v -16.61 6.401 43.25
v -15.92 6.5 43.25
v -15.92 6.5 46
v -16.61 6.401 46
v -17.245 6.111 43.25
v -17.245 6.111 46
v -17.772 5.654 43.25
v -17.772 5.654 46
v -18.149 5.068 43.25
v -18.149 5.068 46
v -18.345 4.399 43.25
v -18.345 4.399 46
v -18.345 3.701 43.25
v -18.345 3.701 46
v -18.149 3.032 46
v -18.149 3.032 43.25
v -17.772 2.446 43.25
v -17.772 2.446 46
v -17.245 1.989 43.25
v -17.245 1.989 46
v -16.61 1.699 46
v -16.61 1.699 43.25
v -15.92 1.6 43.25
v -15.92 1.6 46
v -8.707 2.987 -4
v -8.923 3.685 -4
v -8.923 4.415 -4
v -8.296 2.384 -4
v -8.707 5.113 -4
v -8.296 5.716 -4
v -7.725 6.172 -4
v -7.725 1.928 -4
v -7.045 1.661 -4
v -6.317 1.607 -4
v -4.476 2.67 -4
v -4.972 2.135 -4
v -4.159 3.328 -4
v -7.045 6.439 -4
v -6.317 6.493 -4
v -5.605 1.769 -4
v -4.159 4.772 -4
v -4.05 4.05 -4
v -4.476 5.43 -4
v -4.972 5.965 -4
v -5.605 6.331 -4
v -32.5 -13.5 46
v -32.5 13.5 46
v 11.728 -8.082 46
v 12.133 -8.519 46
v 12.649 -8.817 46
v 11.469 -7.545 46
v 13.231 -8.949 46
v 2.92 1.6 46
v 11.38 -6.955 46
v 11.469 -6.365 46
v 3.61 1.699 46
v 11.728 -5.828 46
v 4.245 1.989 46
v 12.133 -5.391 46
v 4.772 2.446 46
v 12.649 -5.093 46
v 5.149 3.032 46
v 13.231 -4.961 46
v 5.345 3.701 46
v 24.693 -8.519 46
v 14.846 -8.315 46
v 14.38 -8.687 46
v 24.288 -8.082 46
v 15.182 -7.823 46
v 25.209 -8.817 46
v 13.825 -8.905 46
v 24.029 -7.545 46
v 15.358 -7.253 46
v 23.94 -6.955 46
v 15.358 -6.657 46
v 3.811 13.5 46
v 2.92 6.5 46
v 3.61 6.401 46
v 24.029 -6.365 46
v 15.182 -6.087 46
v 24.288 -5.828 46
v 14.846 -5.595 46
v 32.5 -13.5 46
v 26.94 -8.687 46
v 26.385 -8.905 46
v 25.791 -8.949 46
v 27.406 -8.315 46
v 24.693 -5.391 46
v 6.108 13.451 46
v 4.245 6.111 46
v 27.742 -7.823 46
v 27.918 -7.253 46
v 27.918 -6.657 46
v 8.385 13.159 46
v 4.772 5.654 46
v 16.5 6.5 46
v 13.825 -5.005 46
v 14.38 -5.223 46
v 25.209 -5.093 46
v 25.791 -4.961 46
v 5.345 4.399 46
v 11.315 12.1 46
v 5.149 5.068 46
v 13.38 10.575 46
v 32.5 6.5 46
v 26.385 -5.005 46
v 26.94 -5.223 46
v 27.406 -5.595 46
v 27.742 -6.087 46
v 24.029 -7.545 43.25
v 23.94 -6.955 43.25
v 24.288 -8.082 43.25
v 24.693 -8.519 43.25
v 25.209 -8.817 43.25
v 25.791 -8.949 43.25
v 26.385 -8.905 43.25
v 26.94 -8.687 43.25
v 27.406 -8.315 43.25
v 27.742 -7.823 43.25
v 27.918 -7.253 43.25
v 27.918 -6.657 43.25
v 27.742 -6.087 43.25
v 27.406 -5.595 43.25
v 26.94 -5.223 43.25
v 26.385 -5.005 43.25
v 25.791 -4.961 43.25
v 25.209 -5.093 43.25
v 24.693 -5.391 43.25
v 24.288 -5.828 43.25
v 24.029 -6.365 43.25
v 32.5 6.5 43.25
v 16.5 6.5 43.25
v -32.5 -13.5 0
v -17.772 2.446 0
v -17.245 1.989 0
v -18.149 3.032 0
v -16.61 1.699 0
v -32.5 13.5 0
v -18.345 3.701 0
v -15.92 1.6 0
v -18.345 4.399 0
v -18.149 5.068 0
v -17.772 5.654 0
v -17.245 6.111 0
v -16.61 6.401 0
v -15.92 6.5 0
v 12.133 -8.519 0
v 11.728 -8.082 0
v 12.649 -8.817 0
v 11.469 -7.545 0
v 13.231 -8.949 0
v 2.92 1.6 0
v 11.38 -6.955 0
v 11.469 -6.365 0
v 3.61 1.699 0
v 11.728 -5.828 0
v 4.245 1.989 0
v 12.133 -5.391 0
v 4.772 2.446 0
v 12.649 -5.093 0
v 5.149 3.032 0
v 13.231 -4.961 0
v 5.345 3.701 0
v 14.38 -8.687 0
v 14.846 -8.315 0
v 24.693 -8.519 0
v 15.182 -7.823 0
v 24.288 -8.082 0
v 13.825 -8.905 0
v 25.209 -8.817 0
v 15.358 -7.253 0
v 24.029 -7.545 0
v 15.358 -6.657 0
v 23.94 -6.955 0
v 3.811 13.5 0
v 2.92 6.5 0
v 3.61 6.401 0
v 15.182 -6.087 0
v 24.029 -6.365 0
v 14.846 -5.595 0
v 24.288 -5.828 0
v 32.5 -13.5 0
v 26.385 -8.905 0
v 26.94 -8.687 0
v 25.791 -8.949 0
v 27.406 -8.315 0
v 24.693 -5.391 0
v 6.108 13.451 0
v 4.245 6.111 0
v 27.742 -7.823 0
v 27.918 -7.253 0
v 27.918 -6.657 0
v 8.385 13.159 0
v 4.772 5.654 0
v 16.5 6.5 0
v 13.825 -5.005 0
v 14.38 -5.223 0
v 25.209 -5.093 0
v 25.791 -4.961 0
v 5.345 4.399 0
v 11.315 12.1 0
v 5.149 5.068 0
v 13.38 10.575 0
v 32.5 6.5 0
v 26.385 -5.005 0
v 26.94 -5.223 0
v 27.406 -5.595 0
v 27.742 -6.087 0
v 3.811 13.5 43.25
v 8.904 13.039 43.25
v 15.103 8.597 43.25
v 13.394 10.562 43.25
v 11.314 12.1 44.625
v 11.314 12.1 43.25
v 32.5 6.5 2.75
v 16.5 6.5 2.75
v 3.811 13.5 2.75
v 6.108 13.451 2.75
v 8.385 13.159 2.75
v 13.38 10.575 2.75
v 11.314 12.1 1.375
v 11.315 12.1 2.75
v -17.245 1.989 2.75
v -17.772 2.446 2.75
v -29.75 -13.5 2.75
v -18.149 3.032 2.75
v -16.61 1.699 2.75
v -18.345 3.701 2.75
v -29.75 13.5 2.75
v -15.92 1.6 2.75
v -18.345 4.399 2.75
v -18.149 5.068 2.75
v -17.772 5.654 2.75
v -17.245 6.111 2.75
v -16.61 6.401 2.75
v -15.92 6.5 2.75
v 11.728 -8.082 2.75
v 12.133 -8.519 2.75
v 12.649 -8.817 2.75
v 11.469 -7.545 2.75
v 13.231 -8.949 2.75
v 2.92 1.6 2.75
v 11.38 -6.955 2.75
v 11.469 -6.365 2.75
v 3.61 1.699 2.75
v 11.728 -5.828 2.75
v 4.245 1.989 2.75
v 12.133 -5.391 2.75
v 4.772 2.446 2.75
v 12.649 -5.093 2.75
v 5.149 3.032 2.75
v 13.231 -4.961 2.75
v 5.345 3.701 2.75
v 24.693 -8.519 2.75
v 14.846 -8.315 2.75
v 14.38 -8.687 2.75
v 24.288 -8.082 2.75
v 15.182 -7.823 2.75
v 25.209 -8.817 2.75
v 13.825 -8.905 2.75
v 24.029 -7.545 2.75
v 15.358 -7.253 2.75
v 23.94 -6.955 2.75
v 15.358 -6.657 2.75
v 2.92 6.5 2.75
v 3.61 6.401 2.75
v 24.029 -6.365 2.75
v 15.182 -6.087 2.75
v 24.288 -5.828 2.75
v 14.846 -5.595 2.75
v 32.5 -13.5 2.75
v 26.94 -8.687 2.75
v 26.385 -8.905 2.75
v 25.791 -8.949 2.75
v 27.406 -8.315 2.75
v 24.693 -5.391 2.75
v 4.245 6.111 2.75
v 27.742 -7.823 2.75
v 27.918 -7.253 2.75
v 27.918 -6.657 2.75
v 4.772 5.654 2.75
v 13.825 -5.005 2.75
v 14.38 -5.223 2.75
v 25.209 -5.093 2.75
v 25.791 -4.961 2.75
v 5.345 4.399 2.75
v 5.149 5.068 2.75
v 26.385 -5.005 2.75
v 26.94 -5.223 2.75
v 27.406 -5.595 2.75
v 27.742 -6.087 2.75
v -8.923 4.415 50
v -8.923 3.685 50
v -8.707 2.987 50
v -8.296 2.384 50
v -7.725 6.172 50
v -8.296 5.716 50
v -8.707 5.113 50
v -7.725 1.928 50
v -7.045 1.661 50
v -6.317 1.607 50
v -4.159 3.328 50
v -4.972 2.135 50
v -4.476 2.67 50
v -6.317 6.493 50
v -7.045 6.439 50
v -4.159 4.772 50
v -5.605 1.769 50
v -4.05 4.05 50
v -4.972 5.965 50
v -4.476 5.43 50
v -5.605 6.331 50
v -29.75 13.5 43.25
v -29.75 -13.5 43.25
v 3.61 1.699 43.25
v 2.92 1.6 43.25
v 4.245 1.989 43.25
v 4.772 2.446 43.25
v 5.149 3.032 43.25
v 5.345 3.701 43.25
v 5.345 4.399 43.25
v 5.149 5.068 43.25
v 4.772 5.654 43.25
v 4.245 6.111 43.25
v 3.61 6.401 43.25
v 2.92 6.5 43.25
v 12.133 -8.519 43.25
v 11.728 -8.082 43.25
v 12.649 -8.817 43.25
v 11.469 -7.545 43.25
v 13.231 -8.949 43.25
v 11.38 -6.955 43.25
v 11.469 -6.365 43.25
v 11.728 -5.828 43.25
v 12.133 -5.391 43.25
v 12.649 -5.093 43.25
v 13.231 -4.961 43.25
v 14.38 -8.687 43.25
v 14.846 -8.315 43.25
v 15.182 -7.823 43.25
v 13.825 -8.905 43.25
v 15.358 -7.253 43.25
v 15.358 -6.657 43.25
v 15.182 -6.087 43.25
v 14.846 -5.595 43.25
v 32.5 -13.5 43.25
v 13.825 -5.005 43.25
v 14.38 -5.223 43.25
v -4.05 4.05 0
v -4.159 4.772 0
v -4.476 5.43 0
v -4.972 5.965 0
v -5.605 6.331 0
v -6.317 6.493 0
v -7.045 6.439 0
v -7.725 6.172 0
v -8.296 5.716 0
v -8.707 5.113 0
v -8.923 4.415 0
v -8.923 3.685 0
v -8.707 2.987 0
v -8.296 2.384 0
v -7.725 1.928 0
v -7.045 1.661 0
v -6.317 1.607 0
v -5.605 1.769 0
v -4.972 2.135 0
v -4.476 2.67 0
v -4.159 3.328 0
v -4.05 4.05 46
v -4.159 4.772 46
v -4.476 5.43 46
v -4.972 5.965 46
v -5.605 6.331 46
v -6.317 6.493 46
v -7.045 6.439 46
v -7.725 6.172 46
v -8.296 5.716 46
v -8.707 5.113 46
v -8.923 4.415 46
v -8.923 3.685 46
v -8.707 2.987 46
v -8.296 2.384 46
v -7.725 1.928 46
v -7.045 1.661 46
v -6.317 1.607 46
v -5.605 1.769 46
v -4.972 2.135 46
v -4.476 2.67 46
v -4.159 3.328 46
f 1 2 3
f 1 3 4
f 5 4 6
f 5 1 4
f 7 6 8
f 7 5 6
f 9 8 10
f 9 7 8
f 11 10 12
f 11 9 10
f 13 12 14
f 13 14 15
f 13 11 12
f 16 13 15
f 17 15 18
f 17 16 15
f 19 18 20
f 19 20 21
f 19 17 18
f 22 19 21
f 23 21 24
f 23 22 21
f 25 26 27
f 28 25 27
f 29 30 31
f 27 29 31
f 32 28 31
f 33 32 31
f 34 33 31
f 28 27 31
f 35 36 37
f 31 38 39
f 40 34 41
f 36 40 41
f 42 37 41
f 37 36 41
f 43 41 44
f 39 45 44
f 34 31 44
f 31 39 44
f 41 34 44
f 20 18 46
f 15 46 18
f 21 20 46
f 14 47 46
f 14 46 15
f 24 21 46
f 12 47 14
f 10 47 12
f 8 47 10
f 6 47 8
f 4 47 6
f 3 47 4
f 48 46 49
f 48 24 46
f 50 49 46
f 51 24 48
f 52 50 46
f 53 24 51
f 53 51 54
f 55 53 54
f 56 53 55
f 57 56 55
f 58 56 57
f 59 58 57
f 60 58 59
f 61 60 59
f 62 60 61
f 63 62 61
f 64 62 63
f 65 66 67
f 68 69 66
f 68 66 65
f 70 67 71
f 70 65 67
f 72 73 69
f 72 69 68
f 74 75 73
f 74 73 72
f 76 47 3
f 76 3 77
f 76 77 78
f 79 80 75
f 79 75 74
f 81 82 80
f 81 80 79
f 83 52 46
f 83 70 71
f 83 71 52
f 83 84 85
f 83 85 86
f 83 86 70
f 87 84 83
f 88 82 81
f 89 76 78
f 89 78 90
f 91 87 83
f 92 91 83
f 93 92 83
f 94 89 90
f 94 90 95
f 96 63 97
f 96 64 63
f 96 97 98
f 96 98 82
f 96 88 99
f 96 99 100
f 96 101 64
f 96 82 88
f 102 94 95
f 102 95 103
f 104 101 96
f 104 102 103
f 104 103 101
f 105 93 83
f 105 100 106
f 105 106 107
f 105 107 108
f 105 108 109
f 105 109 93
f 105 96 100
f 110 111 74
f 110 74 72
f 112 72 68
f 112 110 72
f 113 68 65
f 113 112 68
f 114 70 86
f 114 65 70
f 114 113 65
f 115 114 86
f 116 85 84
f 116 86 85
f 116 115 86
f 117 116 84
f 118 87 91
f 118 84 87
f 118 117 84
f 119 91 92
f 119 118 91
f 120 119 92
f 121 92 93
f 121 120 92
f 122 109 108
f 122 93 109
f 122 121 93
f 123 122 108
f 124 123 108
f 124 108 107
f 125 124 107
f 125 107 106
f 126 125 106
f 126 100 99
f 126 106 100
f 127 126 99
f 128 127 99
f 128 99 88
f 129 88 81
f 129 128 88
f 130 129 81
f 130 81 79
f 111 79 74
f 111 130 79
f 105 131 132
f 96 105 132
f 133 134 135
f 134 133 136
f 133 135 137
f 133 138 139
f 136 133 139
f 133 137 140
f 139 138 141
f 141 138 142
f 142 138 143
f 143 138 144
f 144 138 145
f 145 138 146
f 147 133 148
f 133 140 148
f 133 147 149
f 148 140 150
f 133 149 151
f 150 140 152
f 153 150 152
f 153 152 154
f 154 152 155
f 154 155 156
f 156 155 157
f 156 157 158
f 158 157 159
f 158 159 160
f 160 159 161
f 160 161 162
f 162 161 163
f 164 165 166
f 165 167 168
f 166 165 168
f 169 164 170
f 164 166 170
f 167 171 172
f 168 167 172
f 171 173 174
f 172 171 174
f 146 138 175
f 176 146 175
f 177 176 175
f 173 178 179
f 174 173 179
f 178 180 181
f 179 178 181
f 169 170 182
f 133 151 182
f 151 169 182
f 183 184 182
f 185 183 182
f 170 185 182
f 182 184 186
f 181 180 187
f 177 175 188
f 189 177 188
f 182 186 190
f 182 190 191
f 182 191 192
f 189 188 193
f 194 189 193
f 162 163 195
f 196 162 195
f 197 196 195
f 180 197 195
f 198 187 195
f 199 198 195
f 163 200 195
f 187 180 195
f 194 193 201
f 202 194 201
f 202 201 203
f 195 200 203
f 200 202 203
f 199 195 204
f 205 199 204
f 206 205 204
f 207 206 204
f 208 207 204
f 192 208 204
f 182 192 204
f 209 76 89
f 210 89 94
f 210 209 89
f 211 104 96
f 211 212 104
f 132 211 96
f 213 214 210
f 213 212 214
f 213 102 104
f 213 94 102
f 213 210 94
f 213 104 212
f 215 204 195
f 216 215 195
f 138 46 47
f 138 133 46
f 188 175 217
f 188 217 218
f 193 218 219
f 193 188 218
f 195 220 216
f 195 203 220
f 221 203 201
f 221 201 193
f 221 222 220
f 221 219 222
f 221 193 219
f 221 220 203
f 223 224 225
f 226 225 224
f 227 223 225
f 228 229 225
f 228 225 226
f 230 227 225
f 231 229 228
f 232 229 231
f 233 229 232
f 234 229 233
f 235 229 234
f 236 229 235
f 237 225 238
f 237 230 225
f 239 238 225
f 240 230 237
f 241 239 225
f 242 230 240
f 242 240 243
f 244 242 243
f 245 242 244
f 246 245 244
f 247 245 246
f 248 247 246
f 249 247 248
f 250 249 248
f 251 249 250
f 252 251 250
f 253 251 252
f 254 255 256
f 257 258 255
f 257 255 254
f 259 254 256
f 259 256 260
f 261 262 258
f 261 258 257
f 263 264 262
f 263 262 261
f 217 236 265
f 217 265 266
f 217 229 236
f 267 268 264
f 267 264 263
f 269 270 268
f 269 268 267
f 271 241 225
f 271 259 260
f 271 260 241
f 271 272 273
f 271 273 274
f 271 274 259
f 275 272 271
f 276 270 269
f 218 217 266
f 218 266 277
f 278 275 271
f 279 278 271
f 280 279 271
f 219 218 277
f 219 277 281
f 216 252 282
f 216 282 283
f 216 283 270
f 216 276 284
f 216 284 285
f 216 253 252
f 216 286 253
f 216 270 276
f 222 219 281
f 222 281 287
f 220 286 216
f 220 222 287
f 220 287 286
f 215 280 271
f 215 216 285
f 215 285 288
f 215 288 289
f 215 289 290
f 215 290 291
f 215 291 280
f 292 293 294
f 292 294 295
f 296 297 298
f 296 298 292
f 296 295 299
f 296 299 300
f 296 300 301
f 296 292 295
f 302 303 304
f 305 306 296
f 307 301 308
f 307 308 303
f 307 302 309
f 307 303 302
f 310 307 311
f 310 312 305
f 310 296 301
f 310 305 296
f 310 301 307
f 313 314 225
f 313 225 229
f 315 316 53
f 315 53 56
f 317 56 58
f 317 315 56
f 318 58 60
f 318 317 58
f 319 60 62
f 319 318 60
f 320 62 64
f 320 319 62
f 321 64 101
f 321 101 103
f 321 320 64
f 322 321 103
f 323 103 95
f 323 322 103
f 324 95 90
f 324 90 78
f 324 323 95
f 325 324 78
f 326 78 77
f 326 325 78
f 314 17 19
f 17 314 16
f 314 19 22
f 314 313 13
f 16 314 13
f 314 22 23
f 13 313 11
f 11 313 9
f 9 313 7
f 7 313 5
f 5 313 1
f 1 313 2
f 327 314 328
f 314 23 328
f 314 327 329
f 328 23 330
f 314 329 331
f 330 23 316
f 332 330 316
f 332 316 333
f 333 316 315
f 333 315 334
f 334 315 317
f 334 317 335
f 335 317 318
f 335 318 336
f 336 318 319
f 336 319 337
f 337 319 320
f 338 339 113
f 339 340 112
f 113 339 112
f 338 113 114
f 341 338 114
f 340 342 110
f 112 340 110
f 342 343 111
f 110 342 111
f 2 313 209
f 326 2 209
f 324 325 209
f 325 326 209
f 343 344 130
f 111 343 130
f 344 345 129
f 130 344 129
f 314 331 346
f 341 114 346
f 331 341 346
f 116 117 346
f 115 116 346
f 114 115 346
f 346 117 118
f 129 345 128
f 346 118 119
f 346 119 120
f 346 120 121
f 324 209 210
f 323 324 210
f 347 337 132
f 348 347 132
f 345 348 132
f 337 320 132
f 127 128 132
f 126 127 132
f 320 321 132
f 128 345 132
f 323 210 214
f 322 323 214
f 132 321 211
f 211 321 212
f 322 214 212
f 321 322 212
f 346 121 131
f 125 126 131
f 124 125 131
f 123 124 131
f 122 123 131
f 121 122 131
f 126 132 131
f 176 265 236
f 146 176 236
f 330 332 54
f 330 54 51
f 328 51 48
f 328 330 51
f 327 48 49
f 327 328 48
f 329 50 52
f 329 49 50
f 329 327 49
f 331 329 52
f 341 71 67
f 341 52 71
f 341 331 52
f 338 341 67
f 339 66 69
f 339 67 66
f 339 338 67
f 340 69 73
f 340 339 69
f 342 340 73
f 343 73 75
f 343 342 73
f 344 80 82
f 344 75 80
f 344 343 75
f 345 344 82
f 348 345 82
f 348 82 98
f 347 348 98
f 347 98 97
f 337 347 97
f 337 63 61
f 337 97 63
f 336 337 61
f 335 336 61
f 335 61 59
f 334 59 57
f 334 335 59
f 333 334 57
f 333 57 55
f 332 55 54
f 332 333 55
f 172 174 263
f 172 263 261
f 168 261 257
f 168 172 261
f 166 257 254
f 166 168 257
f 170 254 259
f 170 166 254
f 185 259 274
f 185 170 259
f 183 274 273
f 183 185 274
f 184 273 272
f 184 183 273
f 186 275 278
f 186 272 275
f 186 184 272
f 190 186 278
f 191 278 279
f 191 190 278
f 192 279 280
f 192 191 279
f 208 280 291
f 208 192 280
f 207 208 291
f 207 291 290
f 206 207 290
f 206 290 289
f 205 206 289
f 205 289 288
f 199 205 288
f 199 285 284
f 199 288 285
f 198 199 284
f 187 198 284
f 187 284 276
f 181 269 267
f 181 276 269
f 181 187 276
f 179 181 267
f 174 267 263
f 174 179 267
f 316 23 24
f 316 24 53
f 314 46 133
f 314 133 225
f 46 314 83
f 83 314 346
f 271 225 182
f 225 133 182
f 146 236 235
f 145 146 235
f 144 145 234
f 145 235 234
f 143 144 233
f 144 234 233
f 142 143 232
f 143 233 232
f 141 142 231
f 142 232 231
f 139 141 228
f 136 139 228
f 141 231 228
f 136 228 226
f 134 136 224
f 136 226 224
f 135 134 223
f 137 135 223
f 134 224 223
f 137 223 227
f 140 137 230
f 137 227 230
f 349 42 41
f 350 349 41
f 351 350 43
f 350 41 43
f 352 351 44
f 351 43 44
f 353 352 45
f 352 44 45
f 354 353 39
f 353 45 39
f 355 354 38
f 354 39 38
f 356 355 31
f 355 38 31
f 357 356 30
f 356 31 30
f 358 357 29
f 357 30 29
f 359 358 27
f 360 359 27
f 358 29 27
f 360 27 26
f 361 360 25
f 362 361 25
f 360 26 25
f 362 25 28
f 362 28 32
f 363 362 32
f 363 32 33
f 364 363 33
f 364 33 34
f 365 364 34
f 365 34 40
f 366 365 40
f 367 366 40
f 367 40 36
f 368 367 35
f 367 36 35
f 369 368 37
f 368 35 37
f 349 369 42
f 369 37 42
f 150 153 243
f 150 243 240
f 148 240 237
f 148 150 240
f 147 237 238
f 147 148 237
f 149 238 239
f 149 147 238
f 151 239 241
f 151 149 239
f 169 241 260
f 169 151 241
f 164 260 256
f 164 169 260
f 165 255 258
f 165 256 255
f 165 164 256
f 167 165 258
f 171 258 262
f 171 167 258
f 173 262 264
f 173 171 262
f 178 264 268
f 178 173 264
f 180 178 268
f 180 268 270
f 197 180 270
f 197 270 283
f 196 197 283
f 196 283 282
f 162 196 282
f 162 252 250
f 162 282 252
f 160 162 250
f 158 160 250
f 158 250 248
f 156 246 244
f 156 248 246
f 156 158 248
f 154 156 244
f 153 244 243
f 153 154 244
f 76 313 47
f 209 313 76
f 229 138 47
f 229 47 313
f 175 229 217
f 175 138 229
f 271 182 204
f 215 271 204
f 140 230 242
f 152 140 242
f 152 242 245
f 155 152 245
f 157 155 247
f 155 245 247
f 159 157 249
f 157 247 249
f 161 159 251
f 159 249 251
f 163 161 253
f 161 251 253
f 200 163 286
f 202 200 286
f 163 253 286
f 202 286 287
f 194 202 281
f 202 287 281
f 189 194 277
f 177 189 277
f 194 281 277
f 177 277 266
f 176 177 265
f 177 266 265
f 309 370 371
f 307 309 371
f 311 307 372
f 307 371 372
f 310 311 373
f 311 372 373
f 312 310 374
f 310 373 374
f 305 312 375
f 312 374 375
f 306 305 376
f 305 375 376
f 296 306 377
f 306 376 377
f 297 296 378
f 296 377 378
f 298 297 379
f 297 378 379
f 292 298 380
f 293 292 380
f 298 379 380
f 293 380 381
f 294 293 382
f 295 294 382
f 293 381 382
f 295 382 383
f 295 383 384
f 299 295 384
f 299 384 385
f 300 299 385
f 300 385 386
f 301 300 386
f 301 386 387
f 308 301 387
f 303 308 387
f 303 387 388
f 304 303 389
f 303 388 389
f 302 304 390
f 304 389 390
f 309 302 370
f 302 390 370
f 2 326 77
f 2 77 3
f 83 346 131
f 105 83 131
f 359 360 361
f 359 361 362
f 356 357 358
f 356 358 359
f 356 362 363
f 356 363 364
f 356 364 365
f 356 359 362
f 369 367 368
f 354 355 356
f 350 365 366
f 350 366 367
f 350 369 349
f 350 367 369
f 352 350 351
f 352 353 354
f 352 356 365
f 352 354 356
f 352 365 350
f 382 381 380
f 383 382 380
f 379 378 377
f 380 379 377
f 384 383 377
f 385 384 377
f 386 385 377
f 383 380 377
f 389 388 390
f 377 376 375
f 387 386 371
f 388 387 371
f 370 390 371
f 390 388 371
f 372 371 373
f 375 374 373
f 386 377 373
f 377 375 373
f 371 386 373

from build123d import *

# Parameters (mm, degrees)
BOSS_EXTRUDE1_DEPTH     = 2.75
FILLET1_START           = -1
FILLET1_DEPTH           = 5
CUT_EXTRUDE1_DEPTH      = 36.299610618
SKETCH4_W               = 2.75
SKETCH4_H               = 27
BOSS_EXTRUDE2_DEPTH     = 43.25
LPATTERN2_COUNT         = 2
LPATTERN2_PITCH         = 43.25
LPATTERN3_START         = 43.25
LPATTERN3_DEPTH         = 2.75
SKETCH6_R               = 2.45
BOSS_EXTRUDE3_DEPTH     = 4
LPATTERN4_COUNT         = 2
LPATTERN4_PITCH         = 50
CUT_EXTRUDE2_DEPTH      = 62.14327444
CUT_EXTRUDE2_DEPTH_BACK = 62.14327444
SKETCH7_R               = 2
FILLET3_START           = 43.25
FILLET3_DEPTH           = 3.75


with BuildPart() as part:
    # Sketch1 → Boss-Extrude1 (new body)
    with BuildSketch(Plane.XY):
        Polygon((-32.5, -13.5), (32.5, -13.5), (32.5, 6.5), (16.5, 6.5), (16.5, 13.5), (-32.5, 13.5), align=None)
    boss_extrude1 = extrude(amount=BOSS_EXTRUDE1_DEPTH)

    # Fillet1: read off the stored shape, not the designer's step
    # Fillet1 outline → Fillet1 (cut)
    with BuildSketch(Plane.XY.offset(FILLET1_START)):
        with BuildLine():
            Line((16.5, 13.5), (3.81142246, 13.5))
            add(Edge.make_bspline(
                [(3.81142246, 13.5), (5.301266164, 13.5), (6.791109869, 13.5), (10.115693614, 13.127081209), (12.822268118, 11.633925537), (14.910833382, 9.020532983), (15.705416691, 7.760266491), (16.5, 6.5)],
                knots=[0, 0, 0, 0, 0, 0, 0.5, 0.5, 1, 1, 1, 1, 1, 1], degree=5))
            Line((16.5, 6.5), (16.5, 13.5))
        make_face()
    extrude(amount=FILLET1_DEPTH, mode=Mode.SUBTRACT)

    # Sketch2 → Cut-Extrude1 (cut, symmetric)
    with BuildSketch(Plane.XY.offset(2.75)):
        with BuildLine():
            Line((-15.92, 1.6), (2.92, 1.6))
            ThreePointArc((2.92, 1.6), (5.37, 4.05), (2.92, 6.5))
            Line((2.92, 6.5), (-15.92, 6.5))
            ThreePointArc((-15.92, 6.5), (-18.37, 4.05), (-15.92, 1.6))
        make_face()
    extrude(amount=CUT_EXTRUDE1_DEPTH, both=True, mode=Mode.SUBTRACT)

    # Sketch4 → Boss-Extrude2 (add)
    with BuildSketch(Plane.XY.offset(2.75)):
        with Locations((-31.125, 0)):
            Rectangle(SKETCH4_W, SKETCH4_H)
    extrude(amount=BOSS_EXTRUDE2_DEPTH)

    # LPattern2: Boss-Extrude1 ×2
    with Locations(*[(0, 0, i * LPATTERN2_PITCH) for i in range(1, LPATTERN2_COUNT)]):
        add(boss_extrude1)

    # LPattern3: read off the stored shape, not the designer's step
    # LPattern3 outline → LPattern3 (cut)
    with BuildSketch(Plane.XY.offset(LPATTERN3_START)):
        with BuildLine():
            Line((2.92, 6.5), (-15.92, 6.5))
            ThreePointArc((-15.92, 6.5), (-18.37, 4.05), (-15.92, 1.6))
            Line((-15.92, 1.6), (2.92, 1.6))
            ThreePointArc((2.92, 1.6), (5.37, 4.05), (2.92, 6.5))
        make_face()
    extrude(amount=LPATTERN3_DEPTH, mode=Mode.SUBTRACT)

    # Sketch7 → Cut-Extrude2 (cut, two sides: drawn at the far end of the back side and taken through both)
    with BuildSketch(Plane.XY.offset(46).offset(-CUT_EXTRUDE2_DEPTH_BACK)):
        with Locations(Location((13.38, -6.955, 0), (0, 0, 180))):
            Circle(SKETCH7_R)
        with Locations(Location((25.94, -6.955, 0), (0, 0, 180))):
            Circle(SKETCH7_R)
    extrude(amount=CUT_EXTRUDE2_DEPTH + CUT_EXTRUDE2_DEPTH_BACK, mode=Mode.SUBTRACT)

    # Fillet3: read off the stored shape, not the designer's step
    # Fillet3 outline → Fillet3 (cut)
    with BuildSketch(Plane.XY.offset(FILLET3_START)):
        with BuildLine():
            Line((16.5, 13.5), (3.81142246, 13.5))
            add(Edge.make_bspline(
                [(3.81142246, 13.5), (5.301266164, 13.5), (6.791109869, 13.5), (10.115693614, 13.127081209), (12.822268118, 11.633925537), (14.910833382, 9.020532983), (15.705416691, 7.760266491), (16.5, 6.5)],
                knots=[0, 0, 0, 0, 0, 0, 0.5, 0.5, 1, 1, 1, 1, 1, 1], degree=5))
            Line((16.5, 6.5), (16.5, 13.5))
        make_face()
    extrude(amount=FILLET3_DEPTH, mode=Mode.SUBTRACT)


with BuildPart() as body_2:
    # Sketch6 → Boss-Extrude3 (new body)
    with BuildSketch(Plane.XY.offset(46)):
        with Locations((-6.5, 4.05)):
            Circle(SKETCH6_R)
    boss_extrude3 = extrude(amount=BOSS_EXTRUDE3_DEPTH)


with BuildPart() as lpattern4_1:
    # LPattern4: Boss-Extrude3 ×2
    with Locations(*[(0, 0, -i * LPATTERN4_PITCH) for i in range(1, LPATTERN4_COUNT)]):
        add(boss_extrude3)


solid = Compound([part.part, body_2.part, lpattern4_1.part])
